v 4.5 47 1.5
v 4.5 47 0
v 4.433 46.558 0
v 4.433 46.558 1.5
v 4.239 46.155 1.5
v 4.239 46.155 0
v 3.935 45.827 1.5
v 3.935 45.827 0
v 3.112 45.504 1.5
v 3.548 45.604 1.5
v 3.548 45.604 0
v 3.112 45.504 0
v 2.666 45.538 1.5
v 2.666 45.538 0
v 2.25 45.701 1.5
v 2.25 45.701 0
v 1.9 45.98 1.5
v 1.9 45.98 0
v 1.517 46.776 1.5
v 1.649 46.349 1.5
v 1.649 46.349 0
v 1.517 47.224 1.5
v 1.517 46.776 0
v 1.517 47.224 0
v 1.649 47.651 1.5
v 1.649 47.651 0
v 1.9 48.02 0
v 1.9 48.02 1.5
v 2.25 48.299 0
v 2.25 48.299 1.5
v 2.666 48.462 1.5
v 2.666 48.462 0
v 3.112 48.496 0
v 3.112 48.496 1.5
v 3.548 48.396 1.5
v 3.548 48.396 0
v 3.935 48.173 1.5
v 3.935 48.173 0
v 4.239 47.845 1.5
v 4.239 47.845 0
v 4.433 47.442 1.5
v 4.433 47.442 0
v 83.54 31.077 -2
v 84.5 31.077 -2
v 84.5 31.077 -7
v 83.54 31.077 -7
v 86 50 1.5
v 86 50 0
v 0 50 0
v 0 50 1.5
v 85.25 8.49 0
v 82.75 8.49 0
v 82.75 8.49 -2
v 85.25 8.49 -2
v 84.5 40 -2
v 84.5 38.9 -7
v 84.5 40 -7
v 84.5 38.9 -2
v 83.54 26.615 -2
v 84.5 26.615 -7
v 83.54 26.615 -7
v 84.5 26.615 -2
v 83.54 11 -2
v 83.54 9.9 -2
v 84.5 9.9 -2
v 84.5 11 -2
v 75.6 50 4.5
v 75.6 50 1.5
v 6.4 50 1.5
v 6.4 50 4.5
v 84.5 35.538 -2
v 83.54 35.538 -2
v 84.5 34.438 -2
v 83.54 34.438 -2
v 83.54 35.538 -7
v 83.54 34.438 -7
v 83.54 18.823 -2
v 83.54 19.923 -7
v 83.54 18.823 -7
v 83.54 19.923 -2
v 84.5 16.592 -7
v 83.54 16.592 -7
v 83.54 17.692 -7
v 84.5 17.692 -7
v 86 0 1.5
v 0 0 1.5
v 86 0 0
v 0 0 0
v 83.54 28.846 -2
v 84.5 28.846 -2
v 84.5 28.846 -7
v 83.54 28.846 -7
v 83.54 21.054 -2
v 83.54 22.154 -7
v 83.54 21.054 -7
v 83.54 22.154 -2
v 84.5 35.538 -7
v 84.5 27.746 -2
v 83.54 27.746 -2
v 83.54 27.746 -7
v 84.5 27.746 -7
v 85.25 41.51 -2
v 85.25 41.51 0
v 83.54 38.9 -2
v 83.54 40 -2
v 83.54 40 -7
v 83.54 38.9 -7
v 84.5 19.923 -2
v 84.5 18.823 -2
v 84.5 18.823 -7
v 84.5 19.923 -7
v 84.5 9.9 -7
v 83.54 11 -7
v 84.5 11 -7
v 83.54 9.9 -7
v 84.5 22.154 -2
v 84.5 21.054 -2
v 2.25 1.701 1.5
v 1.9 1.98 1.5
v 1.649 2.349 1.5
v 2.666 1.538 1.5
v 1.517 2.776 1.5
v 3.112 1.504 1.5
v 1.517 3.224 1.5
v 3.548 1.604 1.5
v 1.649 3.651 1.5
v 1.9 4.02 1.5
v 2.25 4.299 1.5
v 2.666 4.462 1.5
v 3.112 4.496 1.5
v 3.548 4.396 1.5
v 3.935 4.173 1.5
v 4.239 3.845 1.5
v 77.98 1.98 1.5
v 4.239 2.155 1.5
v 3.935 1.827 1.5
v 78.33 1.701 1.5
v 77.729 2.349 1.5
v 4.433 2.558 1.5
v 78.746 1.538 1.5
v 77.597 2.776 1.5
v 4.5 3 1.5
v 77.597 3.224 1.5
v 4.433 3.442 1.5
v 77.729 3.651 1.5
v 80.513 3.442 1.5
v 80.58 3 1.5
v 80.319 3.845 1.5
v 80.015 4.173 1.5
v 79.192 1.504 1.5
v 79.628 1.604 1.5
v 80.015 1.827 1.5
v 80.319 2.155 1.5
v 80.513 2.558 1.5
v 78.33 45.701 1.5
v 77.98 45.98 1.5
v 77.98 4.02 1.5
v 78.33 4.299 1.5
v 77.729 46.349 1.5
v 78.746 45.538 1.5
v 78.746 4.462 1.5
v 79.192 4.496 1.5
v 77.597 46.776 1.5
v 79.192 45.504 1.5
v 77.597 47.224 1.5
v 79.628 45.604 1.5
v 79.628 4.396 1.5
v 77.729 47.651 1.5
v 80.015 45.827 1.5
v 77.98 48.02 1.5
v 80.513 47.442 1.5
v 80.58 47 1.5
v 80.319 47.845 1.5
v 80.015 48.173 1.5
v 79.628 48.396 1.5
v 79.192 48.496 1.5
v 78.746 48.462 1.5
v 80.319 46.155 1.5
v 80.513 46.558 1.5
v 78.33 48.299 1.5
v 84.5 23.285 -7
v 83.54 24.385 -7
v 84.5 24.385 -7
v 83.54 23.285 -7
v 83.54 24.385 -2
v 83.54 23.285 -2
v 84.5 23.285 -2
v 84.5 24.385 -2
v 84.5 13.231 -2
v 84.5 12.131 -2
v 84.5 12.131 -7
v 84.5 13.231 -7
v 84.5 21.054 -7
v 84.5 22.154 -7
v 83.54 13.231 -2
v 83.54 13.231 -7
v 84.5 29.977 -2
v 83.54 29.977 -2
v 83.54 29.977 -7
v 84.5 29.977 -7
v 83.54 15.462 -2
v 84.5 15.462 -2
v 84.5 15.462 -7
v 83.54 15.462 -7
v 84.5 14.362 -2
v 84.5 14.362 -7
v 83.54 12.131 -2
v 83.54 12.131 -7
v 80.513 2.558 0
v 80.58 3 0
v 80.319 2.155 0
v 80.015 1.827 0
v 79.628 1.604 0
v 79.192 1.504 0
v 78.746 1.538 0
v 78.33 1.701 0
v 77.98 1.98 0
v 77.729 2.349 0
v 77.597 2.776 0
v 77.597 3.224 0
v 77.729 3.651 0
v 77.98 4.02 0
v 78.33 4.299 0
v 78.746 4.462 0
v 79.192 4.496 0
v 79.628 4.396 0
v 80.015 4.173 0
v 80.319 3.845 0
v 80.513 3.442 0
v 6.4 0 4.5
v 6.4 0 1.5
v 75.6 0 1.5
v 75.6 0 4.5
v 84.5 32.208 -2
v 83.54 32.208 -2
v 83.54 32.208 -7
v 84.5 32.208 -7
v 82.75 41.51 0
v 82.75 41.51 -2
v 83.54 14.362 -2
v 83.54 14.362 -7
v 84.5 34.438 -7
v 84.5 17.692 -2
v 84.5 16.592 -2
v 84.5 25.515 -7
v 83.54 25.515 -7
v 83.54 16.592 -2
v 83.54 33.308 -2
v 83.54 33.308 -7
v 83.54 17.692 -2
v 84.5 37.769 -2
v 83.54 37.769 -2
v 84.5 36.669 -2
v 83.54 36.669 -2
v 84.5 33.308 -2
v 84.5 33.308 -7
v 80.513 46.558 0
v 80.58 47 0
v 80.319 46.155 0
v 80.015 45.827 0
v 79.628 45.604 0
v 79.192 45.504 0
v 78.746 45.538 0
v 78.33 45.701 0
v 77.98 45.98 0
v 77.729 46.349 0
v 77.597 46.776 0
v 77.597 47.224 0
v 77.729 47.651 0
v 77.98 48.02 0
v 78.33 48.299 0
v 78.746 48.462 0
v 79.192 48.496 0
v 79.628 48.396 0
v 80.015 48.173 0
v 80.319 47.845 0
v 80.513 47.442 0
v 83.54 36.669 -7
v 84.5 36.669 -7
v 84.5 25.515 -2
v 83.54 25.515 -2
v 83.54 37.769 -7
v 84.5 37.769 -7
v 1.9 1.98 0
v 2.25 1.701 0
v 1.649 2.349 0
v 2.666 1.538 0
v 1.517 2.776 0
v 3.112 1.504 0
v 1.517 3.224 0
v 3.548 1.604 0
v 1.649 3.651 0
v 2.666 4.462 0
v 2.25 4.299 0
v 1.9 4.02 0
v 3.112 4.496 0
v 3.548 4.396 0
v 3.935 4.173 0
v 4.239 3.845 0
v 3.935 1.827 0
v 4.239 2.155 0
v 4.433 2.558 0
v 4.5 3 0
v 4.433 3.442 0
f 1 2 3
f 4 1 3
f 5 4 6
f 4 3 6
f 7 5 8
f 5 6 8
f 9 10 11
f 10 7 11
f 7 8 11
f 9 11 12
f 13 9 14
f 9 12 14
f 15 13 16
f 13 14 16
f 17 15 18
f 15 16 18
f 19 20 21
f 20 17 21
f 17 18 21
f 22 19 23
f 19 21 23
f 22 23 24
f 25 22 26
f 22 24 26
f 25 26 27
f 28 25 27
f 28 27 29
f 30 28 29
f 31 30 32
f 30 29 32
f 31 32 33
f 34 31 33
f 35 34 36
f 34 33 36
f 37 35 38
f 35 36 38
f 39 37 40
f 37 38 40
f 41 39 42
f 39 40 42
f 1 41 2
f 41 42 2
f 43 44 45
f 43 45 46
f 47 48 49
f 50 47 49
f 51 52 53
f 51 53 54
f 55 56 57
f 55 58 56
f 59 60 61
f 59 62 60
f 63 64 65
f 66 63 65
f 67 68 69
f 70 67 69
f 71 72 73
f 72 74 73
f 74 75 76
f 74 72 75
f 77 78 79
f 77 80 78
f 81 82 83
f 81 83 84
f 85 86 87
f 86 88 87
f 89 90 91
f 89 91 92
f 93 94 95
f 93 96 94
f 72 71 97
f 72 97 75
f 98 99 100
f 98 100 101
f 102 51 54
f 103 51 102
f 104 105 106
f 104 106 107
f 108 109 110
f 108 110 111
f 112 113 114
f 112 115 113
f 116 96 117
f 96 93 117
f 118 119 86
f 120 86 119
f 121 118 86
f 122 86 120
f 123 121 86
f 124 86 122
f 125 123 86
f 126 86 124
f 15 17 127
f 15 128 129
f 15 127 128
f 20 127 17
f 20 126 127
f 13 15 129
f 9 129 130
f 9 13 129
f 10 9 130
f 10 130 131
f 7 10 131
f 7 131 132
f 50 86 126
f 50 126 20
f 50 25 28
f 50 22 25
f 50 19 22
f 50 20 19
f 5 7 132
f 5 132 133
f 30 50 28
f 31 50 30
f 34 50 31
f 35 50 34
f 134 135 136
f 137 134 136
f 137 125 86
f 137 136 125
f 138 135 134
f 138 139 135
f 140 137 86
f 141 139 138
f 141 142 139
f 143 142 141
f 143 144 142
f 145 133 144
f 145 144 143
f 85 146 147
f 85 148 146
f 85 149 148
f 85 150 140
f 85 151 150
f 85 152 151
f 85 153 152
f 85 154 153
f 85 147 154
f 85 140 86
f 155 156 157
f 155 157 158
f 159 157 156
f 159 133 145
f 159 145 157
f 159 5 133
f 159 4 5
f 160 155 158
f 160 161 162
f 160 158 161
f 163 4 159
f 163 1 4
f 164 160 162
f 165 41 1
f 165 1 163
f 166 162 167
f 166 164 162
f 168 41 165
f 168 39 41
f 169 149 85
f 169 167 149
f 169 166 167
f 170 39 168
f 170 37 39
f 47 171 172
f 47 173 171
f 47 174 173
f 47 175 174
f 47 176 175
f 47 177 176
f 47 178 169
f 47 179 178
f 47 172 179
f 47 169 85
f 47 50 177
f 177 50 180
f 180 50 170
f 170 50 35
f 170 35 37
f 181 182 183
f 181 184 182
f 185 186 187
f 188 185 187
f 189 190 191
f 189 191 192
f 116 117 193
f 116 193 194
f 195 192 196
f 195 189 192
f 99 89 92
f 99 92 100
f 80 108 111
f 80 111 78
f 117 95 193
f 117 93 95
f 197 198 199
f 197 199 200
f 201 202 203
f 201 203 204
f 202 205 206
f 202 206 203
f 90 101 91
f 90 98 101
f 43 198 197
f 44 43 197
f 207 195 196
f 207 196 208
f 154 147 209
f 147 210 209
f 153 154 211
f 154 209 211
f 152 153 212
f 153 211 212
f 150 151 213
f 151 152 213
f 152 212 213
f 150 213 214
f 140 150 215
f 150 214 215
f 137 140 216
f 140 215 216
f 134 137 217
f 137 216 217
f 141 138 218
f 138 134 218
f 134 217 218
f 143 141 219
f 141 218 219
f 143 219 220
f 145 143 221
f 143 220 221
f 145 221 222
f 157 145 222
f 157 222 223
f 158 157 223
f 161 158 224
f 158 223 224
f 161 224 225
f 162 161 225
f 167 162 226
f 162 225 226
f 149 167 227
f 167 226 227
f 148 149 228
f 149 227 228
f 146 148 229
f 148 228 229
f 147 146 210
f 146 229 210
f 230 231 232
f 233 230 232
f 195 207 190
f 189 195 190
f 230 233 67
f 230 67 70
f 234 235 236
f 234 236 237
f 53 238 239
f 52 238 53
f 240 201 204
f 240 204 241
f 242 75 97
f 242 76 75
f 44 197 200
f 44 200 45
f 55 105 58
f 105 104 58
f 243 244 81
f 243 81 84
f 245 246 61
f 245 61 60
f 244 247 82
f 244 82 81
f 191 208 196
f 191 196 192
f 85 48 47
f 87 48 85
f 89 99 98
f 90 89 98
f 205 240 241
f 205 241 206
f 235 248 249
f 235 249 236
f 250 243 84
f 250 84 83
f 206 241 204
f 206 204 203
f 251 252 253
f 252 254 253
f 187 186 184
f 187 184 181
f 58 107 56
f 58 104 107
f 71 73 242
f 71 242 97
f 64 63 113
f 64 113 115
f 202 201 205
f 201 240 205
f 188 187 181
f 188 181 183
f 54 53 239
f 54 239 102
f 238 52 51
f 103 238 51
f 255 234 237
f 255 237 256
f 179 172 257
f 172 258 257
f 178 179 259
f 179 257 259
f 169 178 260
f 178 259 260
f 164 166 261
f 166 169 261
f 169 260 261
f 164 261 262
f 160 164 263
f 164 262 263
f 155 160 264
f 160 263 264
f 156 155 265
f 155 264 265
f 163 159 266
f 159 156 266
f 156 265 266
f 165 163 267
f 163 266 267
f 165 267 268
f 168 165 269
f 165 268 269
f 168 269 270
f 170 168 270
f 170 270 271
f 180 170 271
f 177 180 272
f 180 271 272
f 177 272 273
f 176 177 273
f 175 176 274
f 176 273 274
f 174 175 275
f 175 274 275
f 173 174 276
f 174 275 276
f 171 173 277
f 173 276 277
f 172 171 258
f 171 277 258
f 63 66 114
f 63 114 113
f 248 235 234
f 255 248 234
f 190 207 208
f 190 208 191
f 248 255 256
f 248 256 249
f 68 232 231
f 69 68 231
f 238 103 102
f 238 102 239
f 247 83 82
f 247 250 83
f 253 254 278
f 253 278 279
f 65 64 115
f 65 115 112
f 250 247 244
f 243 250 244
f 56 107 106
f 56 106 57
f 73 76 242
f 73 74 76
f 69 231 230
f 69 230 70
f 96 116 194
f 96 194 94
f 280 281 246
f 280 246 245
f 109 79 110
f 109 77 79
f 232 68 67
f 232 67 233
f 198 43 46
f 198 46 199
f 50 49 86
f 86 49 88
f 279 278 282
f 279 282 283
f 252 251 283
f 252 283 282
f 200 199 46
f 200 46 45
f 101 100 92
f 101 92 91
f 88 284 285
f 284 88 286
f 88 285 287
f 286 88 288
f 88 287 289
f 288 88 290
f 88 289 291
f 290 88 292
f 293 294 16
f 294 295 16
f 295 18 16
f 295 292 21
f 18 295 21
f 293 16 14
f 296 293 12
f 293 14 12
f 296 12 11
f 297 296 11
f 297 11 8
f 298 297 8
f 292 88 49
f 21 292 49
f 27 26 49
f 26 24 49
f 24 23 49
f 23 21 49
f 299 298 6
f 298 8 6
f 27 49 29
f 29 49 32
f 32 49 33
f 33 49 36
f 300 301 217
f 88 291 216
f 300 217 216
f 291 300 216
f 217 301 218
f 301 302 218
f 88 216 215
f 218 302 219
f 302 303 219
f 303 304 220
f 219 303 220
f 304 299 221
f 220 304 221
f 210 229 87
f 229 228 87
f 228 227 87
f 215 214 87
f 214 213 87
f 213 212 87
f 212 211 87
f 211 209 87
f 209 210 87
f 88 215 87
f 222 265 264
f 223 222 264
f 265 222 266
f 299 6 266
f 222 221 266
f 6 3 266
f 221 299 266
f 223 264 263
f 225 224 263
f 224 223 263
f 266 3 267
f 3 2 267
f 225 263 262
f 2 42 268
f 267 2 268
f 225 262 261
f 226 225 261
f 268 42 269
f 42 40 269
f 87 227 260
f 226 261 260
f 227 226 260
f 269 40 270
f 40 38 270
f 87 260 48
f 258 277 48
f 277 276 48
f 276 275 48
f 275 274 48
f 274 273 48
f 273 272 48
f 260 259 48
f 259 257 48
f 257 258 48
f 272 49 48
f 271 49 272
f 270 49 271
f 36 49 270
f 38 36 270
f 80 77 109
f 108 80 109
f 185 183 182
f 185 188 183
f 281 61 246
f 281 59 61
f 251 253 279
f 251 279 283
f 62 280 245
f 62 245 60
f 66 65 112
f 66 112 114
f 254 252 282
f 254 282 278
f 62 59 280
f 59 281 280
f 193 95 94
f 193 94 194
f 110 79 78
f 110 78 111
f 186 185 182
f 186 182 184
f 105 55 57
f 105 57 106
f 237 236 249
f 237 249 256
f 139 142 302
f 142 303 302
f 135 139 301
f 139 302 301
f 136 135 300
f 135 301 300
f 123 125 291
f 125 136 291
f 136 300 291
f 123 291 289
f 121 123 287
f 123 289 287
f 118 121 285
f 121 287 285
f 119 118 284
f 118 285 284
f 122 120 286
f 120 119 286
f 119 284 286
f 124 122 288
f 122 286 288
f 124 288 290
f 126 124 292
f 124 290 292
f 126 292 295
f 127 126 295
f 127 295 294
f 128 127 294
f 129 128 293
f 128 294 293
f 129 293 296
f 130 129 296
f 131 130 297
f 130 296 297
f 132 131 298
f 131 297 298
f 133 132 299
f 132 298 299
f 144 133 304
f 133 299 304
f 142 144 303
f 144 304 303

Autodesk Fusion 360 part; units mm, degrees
sketch "草图1" plane through (0, 0, 0) normal (0, 0, 1) x (1, 0, 0)
  line L0 (0, 0) -> (6.4, 0)
  line L1 (6.4, 0) -> (6.4, 50)
  line L2 (6.4, 50) -> (0, 50)
  line L3 (0, 50) -> (0, 0)
  line L4 (6.4, 50) -> (75.6, 50)
  line L5 (75.6, 50) -> (75.6, 0)
  line L6 (75.6, 0) -> (6.4, 0)
  line L7 (6.4, 0) -> (6.4, 50)
  line L8 (75.6, 50) -> (86, 50)
  line L9 (86, 50) -> (86, 0)
  line L10 (86, 0) -> (75.6, 0)
  line L11 (75.6, 0) -> (75.6, 50)
  line L12 (-10, 25) -> (111.3719, 25)
  circle A0 centre (3, 3) radius 1.5
  circle A1 centre (3, 47) radius 1.5
  circle A2 centre (79.08, 47) radius 1.5
  circle A3 centre (79.08, 3) radius 1.5
  dimension "d1" = 50
  dimension "d2" = 6.4
  dimension "d3" = 69.2
  dimension "d4" = 10.4
  dimension "d5" = 3
  dimension "d6" = 3
  dimension "d7" = 3
  dimension "d8" = 50
  dimension "d9" = 3
  dimension "d10" = 3
  dimension "d11" = 6.92
extrude "拉伸1" add sketch "草图1" along normal blind 1.5 makes body 1
sketch "草图2" plane through (0, 0, 1.5) normal (0, 0, 1) x (-1, 0, 0)
  circle A0 centre (-3, -47) radius 1.5
  circle A1 centre (-79.08, -47) radius 1.5
  circle A2 centre (-3, -3) radius 1.5
  circle A3 centre (-79.08, -3) radius 1.5
  line L0 (-86, -50) -> (0, -50)
  line L1 (0, -50) -> (0, 0)
  line L2 (0, 0) -> (-86, 0)
  line L3 (-86, 0) -> (-86, -50)
  line L4 (-6.4, -50) -> (-75.6, -50)
  line L5 (-75.6, -50) -> (-75.6, 0)
  line L6 (-75.6, 0) -> (-6.4, 0)
  line L7 (-6.4, 0) -> (-6.4, -50)
  dimension "d14" = 69.2
  dimension "d15" = 6.4
extrude "拉伸2" add sketch "草图2" along normal blind 3 separate body contours L0 L2 L4 L5 L6 L7 makes body 2
sketch "草图3" plane through (0, 0, 0) normal (0, 0, -1) x (1, 0, 0)
  circle A0 centre (3, -47) radius 1.5
  circle A1 centre (79.08, -47) radius 1.5
  circle A2 centre (3, -3) radius 1.5
  circle A3 centre (79.08, -3) radius 1.5
  line L0 (0, -50) -> (86, -50)
  line L1 (86, -50) -> (86, 0)
  line L2 (86, 0) -> (0, 0)
  line L3 (0, 0) -> (0, -50)
  line L4 (82.75, -8.49) -> (85.25, -8.49)
  line L5 (85.25, -8.49) -> (85.25, -41.51)
  line L6 (85.25, -41.51) -> (82.75, -41.51)
  line L7 (82.75, -41.51) -> (82.75, -8.49)
  dimension "d18" = 8.49
  dimension "d19" = 8.49
  dimension "d20" = 2.5
  dimension "d21" = 0.75
extrude "拉伸3" add sketch "草图3" along normal blind 2 separate body contours L4 L5 L6 L7 makes body 3
sketch "草图4" plane through (0, 0, -2) normal (0, 0, -1) x (1, 0, 0)
  line L0 (82.75, -41.51) -> (85.25, -41.51)
  line L1 (85.25, -41.51) -> (85.25, -8.49)
  line L2 (85.25, -8.49) -> (82.75, -8.49)
  line L3 (82.75, -8.49) -> (82.75, -41.51)
  line L4 (84.5, -11) -> (83.5404, -11)
  line L5 (83.5404, -11) -> (83.5404, -9.9)
  line L6 (83.5404, -9.9) -> (84.5, -9.9)
  line L7 (84.5, -9.9) -> (84.5, -11)
  line L8 (84.5, -11) -> (83.5404, -9.9) construction
  line L9 (83.5404, -11) -> (84.5, -9.9) construction
  line L10 (83.5404, -13.2308) -> (83.5404, -12.1308)
  line L11 (84.5, -13.2308) -> (83.5404, -13.2308)
  line L12 (83.5404, -12.1308) -> (84.5, -12.1308)
  line L13 (84.5, -12.1308) -> (84.5, -13.2308)
  line L14 (83.5404, -15.4615) -> (83.5404, -14.3615)
  line L15 (84.5, -15.4615) -> (83.5404, -15.4615)
  line L16 (83.5404, -14.3615) -> (84.5, -14.3615)
  line L17 (84.5, -14.3615) -> (84.5, -15.4615)
  line L18 (83.5404, -17.6923) -> (83.5404, -16.5923)
  line L19 (84.5, -17.6923) -> (83.5404, -17.6923)
  line L20 (83.5404, -16.5923) -> (84.5, -16.5923)
  line L21 (84.5, -16.5923) -> (84.5, -17.6923)
  line L22 (83.5404, -19.9231) -> (83.5404, -18.8231)
  line L23 (84.5, -19.9231) -> (83.5404, -19.9231)
  line L24 (83.5404, -18.8231) -> (84.5, -18.8231)
  line L25 (84.5, -18.8231) -> (84.5, -19.9231)
  line L26 (83.5404, -22.1538) -> (83.5404, -21.0538)
  line L27 (84.5, -22.1538) -> (83.5404, -22.1538)
  line L28 (83.5404, -21.0538) -> (84.5, -21.0538)
  line L29 (84.5, -21.0538) -> (84.5, -22.1538)
  line L30 (83.5404, -24.3846) -> (83.5404, -23.2846)
  line L31 (84.5, -24.3846) -> (83.5404, -24.3846)
  line L32 (83.5404, -23.2846) -> (84.5, -23.2846)
  line L33 (84.5, -23.2846) -> (84.5, -24.3846)
  line L34 (83.5404, -26.6154) -> (83.5404, -25.5154)
  line L35 (84.5, -26.6154) -> (83.5404, -26.6154)
  line L36 (83.5404, -25.5154) -> (84.5, -25.5154)
  line L37 (84.5, -25.5154) -> (84.5, -26.6154)
  line L38 (83.5404, -28.8462) -> (83.5404, -27.7462)
  line L39 (84.5, -28.8462) -> (83.5404, -28.8462)
  line L40 (83.5404, -27.7462) -> (84.5, -27.7462)
  line L41 (84.5, -27.7462) -> (84.5, -28.8462)
  line L42 (83.5404, -31.0769) -> (83.5404, -29.9769)
  line L43 (84.5, -31.0769) -> (83.5404, -31.0769)
  line L44 (83.5404, -29.9769) -> (84.5, -29.9769)
  line L45 (84.5, -29.9769) -> (84.5, -31.0769)
  line L46 (83.5404, -33.3077) -> (83.5404, -32.2077)
  line L47 (84.5, -33.3077) -> (83.5404, -33.3077)
  line L48 (83.5404, -32.2077) -> (84.5, -32.2077)
  line L49 (84.5, -32.2077) -> (84.5, -33.3077)
  line L50 (83.5404, -35.5385) -> (83.5404, -34.4385)
  line L51 (84.5, -35.5385) -> (83.5404, -35.5385)
  line L52 (83.5404, -34.4385) -> (84.5, -34.4385)
  line L53 (84.5, -34.4385) -> (84.5, -35.5385)
  line L54 (83.5404, -37.7692) -> (83.5404, -36.6692)
  line L55 (84.5, -37.7692) -> (83.5404, -37.7692)
  line L56 (83.5404, -36.6692) -> (84.5, -36.6692)
  line L57 (84.5, -36.6692) -> (84.5, -37.7692)
  line L58 (83.5404, -40) -> (83.5404, -38.9)
  line L59 (84.5, -40) -> (83.5404, -40)
  line L60 (83.5404, -38.9) -> (84.5, -38.9)
  line L61 (84.5, -38.9) -> (84.5, -40)
  point P0 (84.0202, -10.45)
  dimension "d26" = 0
  dimension "d27" = -29
extrude "拉伸4" add sketch "草图4" along normal blind 5 separate body contours L4 L5 L6 L7 | L10 L11 L12 L13 | L14 L15 L16 L17 | L18 L19 L20 L21 | L22 L23 L24 L25 | L26 L27 L28 L29 | L30 L31 L32 L33 | L34 L35 L36 L37 | L38 L39 L40 L41 | L42 L43 L44 L45 | L46 L47 L48 L49 | L50 L51 L52 L53 | L54 L55 L56 L57 | L58 L59 L60 L61 makes body 4 at (83.5404, 30.7103, -3.6667) makes body 5 at (83.5404, 21.7872, -3.6667) makes body 6 at (83.5404, 12.8641, -3.6667) makes body 7 at (83.5404, 39.6333, -3.6667) makes body 8 at (83.5404, 15.0949, -3.6667) makes body 9 at (83.5404, 24.0179, -3.6667) makes body 10 at (83.5404, 32.941, -3.6667) makes body 11 at (83.5404, 28.4795, -3.6667) makes body 12 at (83.5404, 19.5564, -3.6667) makes body 13 at (83.5404, 10.6333, -3.6667) makes body 14 at (83.5404, 37.4026, -3.6667) makes body 15 at (83.5404, 17.3256, -3.6667) makes body 16 at (83.5404, 26.2487, -3.6667) makes body 17 at (84.5, 34.8051, -3.6667)
copy_body "实体->零部件1" bodies 1 removing the originals makes body 18 in component "Component'"
copy_body "实体->零部件2" bodies 2 removing the originals makes body 19 in component "Component''"
copy_body "实体->零部件3" bodies 3 removing the originals makes body 20 in component "Component'''"
copy_body "实体->零部件4" bodies 4 removing the originals makes body 21 in component "Component''''"
copy_body "实体->零部件5" bodies 5 removing the originals makes body 22 in component "Component'''''"
copy_body "实体->零部件6" bodies 6 removing the originals makes body 23 in component "Component''''''"
copy_body "实体->零部件7" bodies 7 removing the originals makes body 24 in component "Component'''''''"
copy_body "实体->零部件8" bodies 8 removing the originals makes body 25 in component "Component''''''''"
copy_body "实体->零部件9" bodies 9 removing the originals makes body 26 in component "Component'''''''''"
copy_body "实体->零部件10" bodies 10 removing the originals makes body 27 in component "Component''''''''''"
copy_body "实体->零部件11" bodies 11 removing the originals makes body 28 in component "Component'''''''''''"
copy_body "实体->零部件12" bodies 12 removing the originals makes body 29 in component "Component''''''''''''"
copy_body "实体->零部件13" bodies 13 removing the originals makes body 30 in component "Component'''''''''''''"
copy_body "实体->零部件14" bodies 14 removing the originals makes body 31 in component "Component''''''''''''''"
copy_body "实体->零部件15" bodies 15 removing the originals makes body 32 in component "Component'''''''''''''''"
copy_body "实体->零部件16" bodies 16 removing the originals makes body 33 in component "Component''''''''''''''''"
copy_body "实体->零部件17" bodies 17 removing the originals makes body 34 in component "Component'''''''''''''''''"
component "Component'" placed x (1, 0, 0) y (0, 1, 0) z (0, 0, 1) at (0, 0, 0)
component "Component''" placed x (1, 0, 0) y (0, 1, 0) z (0, 0, 1) at (0, 0, 0)
component "Component'''" placed x (1, 0, 0) y (0, 1, 0) z (0, 0, 1) at (0, 0, 0)
component "Component''''" placed x (1, 0, 0) y (0, 1, 0) z (0, 0, 1) at (0, 0, 0)
component "Component'''''" placed x (1, 0, 0) y (0, 1, 0) z (0, 0, 1) at (0, 0, 0)
component "Component''''''" placed x (1, 0, 0) y (0, 1, 0) z (0, 0, 1) at (0, 0, 0)
component "Component'''''''" placed x (1, 0, 0) y (0, 1, 0) z (0, 0, 1) at (0, 0, 0)
component "Component''''''''" placed x (1, 0, 0) y (0, 1, 0) z (0, 0, 1) at (0, 0, 0)
component "Component'''''''''" placed x (1, 0, 0) y (0, 1, 0) z (0, 0, 1) at (0, 0, 0)
component "Component''''''''''" placed x (1, 0, 0) y (0, 1, 0) z (0, 0, 1) at (0, 0, 0)
component "Component'''''''''''" placed x (1, 0, 0) y (0, 1, 0) z (0, 0, 1) at (0, 0, 0)
component "Component''''''''''''" placed x (1, 0, 0) y (0, 1, 0) z (0, 0, 1) at (0, 0, 0)
component "Component'''''''''''''" placed x (1, 0, 0) y (0, 1, 0) z (0, 0, 1) at (0, 0, 0)
component "Component''''''''''''''" placed x (1, 0, 0) y (0, 1, 0) z (0, 0, 1) at (0, 0, 0)
component "Component'''''''''''''''" placed x (1, 0, 0) y (0, 1, 0) z (0, 0, 1) at (0, 0, 0)
component "Component''''''''''''''''" placed x (1, 0, 0) y (0, 1, 0) z (0, 0, 1) at (0, 0, 0)
component "Component'''''''''''''''''" placed x (1, 0, 0) y (0, 1, 0) z (0, 0, 1) at (0, 0, 0)
